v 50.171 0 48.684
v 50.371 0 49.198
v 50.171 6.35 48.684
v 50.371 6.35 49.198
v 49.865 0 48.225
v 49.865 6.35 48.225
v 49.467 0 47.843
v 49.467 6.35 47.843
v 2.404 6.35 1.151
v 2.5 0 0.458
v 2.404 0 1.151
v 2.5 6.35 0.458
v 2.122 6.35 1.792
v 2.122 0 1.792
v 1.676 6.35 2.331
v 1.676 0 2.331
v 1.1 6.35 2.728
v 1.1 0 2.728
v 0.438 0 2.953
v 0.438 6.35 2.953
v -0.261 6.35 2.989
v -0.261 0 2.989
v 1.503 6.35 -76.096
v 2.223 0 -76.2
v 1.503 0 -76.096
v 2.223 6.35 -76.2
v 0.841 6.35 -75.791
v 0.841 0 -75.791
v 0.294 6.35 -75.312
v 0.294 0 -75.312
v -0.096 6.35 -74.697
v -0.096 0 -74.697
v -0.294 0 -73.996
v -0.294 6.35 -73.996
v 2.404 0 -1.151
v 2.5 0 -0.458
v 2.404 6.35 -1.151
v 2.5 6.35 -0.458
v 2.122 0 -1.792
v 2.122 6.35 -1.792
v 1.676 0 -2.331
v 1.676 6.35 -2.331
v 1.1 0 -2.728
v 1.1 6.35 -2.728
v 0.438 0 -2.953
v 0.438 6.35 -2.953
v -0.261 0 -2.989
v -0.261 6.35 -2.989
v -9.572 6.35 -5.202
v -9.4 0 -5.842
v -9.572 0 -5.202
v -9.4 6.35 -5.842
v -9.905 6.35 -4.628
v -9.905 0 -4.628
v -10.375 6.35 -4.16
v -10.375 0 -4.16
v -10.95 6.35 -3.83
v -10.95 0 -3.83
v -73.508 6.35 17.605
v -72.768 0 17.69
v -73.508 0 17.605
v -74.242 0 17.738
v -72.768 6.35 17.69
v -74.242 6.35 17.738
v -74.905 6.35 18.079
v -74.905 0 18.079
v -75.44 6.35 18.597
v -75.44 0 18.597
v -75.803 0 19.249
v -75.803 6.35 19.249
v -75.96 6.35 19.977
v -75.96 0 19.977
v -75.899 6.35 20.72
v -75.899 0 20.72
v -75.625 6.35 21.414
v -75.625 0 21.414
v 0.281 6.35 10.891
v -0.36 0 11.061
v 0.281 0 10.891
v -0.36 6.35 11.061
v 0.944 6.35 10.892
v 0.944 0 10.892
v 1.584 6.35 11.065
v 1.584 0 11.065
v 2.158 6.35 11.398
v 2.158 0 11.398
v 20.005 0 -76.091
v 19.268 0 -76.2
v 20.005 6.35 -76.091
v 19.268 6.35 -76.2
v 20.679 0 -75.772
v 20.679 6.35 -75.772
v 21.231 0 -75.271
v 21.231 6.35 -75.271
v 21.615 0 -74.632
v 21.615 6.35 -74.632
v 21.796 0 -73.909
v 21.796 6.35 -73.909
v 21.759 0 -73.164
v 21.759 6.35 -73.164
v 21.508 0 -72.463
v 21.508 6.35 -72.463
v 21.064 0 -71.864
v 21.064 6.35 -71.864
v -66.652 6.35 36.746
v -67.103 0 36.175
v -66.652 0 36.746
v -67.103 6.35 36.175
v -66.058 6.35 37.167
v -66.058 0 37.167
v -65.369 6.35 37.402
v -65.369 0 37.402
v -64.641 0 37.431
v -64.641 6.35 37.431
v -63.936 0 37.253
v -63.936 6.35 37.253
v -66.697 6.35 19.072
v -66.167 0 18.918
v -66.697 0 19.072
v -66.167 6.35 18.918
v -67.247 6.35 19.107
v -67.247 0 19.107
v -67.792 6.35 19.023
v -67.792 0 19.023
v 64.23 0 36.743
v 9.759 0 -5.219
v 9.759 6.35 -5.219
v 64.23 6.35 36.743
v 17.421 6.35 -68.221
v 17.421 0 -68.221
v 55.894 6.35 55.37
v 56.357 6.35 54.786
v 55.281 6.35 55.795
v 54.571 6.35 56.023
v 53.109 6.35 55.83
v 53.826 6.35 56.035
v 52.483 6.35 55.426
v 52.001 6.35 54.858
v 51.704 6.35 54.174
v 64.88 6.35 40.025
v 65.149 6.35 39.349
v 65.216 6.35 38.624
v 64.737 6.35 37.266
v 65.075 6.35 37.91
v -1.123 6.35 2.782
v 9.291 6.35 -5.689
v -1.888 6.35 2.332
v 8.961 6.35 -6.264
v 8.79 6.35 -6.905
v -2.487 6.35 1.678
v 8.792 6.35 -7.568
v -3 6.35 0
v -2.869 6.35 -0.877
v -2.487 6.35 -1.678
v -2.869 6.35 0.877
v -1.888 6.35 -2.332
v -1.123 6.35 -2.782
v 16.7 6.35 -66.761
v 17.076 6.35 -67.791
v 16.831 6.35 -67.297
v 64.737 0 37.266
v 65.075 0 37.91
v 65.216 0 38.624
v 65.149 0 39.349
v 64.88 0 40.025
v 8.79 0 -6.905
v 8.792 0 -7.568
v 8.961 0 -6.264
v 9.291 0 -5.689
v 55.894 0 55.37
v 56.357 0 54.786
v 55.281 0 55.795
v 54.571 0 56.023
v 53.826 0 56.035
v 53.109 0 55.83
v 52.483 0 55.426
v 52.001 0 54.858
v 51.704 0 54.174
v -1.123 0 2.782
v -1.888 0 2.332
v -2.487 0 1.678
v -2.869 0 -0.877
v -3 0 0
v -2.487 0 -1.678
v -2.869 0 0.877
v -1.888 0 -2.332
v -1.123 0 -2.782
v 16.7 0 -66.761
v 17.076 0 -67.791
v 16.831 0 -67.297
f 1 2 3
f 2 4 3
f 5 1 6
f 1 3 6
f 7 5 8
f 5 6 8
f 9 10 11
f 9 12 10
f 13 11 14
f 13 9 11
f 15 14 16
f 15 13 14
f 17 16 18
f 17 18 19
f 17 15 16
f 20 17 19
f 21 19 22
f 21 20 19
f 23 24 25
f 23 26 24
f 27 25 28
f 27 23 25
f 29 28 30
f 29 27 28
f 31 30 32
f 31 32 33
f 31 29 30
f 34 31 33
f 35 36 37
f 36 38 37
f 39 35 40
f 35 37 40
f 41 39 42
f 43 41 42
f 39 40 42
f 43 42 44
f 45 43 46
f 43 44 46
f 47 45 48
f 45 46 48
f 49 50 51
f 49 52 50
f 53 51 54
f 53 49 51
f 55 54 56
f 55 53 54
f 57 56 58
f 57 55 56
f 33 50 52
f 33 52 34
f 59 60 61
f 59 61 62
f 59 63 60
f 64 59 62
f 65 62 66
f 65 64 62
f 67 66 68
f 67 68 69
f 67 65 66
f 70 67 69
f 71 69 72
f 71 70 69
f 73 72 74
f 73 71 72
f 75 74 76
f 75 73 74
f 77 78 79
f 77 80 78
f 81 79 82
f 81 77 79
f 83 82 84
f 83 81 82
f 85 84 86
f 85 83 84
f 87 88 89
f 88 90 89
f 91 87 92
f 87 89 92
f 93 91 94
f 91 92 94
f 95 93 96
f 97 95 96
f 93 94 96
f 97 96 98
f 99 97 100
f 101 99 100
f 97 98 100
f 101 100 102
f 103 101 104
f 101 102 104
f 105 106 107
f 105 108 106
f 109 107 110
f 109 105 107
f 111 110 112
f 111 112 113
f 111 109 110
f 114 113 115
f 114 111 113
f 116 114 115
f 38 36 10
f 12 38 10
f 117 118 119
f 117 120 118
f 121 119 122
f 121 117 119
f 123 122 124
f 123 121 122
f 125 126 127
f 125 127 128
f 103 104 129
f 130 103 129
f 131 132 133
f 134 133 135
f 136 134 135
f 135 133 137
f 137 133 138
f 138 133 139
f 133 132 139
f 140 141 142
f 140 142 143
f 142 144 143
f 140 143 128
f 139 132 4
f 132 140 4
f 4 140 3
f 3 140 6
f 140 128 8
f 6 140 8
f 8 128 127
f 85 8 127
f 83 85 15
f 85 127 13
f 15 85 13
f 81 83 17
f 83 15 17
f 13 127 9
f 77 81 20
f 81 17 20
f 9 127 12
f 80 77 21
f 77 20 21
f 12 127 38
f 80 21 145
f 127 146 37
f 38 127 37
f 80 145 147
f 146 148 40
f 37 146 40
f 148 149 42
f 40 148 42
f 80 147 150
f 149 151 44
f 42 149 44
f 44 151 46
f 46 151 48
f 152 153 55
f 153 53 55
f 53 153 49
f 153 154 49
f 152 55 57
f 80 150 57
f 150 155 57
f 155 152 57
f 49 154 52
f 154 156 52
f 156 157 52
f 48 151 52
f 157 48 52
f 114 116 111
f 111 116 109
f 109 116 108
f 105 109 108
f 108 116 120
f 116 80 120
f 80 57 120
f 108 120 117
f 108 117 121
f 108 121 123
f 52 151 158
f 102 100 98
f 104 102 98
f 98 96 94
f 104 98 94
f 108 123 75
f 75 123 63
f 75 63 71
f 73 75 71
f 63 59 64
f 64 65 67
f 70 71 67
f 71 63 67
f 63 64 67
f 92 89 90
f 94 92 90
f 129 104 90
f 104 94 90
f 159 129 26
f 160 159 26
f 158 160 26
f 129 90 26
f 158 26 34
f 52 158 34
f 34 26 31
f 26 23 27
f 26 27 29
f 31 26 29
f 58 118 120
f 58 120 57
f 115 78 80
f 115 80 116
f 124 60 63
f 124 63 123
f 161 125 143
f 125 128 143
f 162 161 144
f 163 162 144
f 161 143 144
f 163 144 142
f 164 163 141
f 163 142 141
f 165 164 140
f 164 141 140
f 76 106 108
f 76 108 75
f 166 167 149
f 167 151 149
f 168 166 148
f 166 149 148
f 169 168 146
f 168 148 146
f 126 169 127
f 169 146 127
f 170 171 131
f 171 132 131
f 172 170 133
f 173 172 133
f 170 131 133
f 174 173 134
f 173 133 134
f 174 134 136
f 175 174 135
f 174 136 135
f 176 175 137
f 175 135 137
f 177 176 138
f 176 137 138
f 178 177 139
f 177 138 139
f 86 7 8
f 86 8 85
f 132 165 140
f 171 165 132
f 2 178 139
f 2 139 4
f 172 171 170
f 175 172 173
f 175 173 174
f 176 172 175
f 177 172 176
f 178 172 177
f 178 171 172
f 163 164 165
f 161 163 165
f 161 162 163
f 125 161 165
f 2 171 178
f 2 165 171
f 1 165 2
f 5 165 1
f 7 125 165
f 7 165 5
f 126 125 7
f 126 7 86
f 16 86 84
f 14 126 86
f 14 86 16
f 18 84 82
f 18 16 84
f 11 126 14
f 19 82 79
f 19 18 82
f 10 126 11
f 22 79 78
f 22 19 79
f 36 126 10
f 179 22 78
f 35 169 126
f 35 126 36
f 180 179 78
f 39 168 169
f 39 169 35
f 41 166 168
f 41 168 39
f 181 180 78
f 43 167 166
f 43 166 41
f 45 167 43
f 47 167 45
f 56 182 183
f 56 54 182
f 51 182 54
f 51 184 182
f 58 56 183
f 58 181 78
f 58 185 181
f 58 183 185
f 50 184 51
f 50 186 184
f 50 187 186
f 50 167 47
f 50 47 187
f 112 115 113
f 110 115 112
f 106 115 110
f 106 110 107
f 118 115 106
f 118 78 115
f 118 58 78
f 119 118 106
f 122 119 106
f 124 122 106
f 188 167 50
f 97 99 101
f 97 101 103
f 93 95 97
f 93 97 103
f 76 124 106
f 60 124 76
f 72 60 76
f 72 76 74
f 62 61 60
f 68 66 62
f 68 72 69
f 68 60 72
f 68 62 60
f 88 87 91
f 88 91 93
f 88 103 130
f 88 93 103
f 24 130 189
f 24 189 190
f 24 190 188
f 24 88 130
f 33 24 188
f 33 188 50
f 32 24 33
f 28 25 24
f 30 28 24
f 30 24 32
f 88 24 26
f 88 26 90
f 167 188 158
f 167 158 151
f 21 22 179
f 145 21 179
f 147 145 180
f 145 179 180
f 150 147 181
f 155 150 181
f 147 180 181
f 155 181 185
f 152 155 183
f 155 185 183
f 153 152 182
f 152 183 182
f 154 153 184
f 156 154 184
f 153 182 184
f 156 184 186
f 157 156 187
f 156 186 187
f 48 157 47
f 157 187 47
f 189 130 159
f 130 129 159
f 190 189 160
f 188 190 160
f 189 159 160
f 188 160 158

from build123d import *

# Parameters (mm, degrees)
BOSS_EXTRUDE1_DEPTH = 6.35
FILLET1_R           = 2.54


with BuildPart() as part:
    # Sketch2 → Boss-Extrude1 (new body)
    with BuildSketch(Plane(origin=(0, 0, 0), x_dir=(1, 0, 0), z_dir=(0, 1, 0))):
        Polygon((0, 76.2), (25.4, 76.2), (16.813378089, 67.613378089), (8.597359078, 6.114164014), (65.991135768, -38.1), (53.291135768, -60.097045256), (50.148214016, -48.367501593), (0.99634182, -10.502613374), (-65.991135768, -38.1), (-78.691135768, -16.102954744), (-66.961592105, -19.245876496), (-9.593700898, 4.38844936), align=None)
        with BuildLine():
            Line((2.499994, 1.658310586), (2.499994, -1.658310586))
            ThreePointArc((2.499994, -1.658310586), (-2.999994, 0), (2.499994, 1.658310586))
        make_face(mode=Mode.SUBTRACT)
    extrude(amount=BOSS_EXTRUDE1_DEPTH)

    # Fillet1
    fillet1_edges = [part.edges().sort_by_distance(p)[0] for p in [
        (-65.991135768, 3.175, 38.1),
        (-78.691135768, 3.175, 16.102954744),
        (-66.961592105, 3.175, 19.245876496),
        (-9.593700898, 3.175, -4.38844936),
        (0, 3.175, -76.2),
        (25.4, 3.175, -76.2),
        (16.813378089, 3.175, -67.613378089),
        (8.597359078, 3.175, -6.114164014),
        (65.991135768, 3.175, 38.1),
        (53.291135768, 3.175, 60.097045256),
        (50.148214016, 3.175, 48.367501593),
        (0.99634182, 3.175, 10.502613374),
        (2.499994, 3.175, 1.658310586),
        (2.499994, 3.175, -1.658310586),
    ]]
    fillet(fillet1_edges, radius=FILLET1_R)


solid = part.part
